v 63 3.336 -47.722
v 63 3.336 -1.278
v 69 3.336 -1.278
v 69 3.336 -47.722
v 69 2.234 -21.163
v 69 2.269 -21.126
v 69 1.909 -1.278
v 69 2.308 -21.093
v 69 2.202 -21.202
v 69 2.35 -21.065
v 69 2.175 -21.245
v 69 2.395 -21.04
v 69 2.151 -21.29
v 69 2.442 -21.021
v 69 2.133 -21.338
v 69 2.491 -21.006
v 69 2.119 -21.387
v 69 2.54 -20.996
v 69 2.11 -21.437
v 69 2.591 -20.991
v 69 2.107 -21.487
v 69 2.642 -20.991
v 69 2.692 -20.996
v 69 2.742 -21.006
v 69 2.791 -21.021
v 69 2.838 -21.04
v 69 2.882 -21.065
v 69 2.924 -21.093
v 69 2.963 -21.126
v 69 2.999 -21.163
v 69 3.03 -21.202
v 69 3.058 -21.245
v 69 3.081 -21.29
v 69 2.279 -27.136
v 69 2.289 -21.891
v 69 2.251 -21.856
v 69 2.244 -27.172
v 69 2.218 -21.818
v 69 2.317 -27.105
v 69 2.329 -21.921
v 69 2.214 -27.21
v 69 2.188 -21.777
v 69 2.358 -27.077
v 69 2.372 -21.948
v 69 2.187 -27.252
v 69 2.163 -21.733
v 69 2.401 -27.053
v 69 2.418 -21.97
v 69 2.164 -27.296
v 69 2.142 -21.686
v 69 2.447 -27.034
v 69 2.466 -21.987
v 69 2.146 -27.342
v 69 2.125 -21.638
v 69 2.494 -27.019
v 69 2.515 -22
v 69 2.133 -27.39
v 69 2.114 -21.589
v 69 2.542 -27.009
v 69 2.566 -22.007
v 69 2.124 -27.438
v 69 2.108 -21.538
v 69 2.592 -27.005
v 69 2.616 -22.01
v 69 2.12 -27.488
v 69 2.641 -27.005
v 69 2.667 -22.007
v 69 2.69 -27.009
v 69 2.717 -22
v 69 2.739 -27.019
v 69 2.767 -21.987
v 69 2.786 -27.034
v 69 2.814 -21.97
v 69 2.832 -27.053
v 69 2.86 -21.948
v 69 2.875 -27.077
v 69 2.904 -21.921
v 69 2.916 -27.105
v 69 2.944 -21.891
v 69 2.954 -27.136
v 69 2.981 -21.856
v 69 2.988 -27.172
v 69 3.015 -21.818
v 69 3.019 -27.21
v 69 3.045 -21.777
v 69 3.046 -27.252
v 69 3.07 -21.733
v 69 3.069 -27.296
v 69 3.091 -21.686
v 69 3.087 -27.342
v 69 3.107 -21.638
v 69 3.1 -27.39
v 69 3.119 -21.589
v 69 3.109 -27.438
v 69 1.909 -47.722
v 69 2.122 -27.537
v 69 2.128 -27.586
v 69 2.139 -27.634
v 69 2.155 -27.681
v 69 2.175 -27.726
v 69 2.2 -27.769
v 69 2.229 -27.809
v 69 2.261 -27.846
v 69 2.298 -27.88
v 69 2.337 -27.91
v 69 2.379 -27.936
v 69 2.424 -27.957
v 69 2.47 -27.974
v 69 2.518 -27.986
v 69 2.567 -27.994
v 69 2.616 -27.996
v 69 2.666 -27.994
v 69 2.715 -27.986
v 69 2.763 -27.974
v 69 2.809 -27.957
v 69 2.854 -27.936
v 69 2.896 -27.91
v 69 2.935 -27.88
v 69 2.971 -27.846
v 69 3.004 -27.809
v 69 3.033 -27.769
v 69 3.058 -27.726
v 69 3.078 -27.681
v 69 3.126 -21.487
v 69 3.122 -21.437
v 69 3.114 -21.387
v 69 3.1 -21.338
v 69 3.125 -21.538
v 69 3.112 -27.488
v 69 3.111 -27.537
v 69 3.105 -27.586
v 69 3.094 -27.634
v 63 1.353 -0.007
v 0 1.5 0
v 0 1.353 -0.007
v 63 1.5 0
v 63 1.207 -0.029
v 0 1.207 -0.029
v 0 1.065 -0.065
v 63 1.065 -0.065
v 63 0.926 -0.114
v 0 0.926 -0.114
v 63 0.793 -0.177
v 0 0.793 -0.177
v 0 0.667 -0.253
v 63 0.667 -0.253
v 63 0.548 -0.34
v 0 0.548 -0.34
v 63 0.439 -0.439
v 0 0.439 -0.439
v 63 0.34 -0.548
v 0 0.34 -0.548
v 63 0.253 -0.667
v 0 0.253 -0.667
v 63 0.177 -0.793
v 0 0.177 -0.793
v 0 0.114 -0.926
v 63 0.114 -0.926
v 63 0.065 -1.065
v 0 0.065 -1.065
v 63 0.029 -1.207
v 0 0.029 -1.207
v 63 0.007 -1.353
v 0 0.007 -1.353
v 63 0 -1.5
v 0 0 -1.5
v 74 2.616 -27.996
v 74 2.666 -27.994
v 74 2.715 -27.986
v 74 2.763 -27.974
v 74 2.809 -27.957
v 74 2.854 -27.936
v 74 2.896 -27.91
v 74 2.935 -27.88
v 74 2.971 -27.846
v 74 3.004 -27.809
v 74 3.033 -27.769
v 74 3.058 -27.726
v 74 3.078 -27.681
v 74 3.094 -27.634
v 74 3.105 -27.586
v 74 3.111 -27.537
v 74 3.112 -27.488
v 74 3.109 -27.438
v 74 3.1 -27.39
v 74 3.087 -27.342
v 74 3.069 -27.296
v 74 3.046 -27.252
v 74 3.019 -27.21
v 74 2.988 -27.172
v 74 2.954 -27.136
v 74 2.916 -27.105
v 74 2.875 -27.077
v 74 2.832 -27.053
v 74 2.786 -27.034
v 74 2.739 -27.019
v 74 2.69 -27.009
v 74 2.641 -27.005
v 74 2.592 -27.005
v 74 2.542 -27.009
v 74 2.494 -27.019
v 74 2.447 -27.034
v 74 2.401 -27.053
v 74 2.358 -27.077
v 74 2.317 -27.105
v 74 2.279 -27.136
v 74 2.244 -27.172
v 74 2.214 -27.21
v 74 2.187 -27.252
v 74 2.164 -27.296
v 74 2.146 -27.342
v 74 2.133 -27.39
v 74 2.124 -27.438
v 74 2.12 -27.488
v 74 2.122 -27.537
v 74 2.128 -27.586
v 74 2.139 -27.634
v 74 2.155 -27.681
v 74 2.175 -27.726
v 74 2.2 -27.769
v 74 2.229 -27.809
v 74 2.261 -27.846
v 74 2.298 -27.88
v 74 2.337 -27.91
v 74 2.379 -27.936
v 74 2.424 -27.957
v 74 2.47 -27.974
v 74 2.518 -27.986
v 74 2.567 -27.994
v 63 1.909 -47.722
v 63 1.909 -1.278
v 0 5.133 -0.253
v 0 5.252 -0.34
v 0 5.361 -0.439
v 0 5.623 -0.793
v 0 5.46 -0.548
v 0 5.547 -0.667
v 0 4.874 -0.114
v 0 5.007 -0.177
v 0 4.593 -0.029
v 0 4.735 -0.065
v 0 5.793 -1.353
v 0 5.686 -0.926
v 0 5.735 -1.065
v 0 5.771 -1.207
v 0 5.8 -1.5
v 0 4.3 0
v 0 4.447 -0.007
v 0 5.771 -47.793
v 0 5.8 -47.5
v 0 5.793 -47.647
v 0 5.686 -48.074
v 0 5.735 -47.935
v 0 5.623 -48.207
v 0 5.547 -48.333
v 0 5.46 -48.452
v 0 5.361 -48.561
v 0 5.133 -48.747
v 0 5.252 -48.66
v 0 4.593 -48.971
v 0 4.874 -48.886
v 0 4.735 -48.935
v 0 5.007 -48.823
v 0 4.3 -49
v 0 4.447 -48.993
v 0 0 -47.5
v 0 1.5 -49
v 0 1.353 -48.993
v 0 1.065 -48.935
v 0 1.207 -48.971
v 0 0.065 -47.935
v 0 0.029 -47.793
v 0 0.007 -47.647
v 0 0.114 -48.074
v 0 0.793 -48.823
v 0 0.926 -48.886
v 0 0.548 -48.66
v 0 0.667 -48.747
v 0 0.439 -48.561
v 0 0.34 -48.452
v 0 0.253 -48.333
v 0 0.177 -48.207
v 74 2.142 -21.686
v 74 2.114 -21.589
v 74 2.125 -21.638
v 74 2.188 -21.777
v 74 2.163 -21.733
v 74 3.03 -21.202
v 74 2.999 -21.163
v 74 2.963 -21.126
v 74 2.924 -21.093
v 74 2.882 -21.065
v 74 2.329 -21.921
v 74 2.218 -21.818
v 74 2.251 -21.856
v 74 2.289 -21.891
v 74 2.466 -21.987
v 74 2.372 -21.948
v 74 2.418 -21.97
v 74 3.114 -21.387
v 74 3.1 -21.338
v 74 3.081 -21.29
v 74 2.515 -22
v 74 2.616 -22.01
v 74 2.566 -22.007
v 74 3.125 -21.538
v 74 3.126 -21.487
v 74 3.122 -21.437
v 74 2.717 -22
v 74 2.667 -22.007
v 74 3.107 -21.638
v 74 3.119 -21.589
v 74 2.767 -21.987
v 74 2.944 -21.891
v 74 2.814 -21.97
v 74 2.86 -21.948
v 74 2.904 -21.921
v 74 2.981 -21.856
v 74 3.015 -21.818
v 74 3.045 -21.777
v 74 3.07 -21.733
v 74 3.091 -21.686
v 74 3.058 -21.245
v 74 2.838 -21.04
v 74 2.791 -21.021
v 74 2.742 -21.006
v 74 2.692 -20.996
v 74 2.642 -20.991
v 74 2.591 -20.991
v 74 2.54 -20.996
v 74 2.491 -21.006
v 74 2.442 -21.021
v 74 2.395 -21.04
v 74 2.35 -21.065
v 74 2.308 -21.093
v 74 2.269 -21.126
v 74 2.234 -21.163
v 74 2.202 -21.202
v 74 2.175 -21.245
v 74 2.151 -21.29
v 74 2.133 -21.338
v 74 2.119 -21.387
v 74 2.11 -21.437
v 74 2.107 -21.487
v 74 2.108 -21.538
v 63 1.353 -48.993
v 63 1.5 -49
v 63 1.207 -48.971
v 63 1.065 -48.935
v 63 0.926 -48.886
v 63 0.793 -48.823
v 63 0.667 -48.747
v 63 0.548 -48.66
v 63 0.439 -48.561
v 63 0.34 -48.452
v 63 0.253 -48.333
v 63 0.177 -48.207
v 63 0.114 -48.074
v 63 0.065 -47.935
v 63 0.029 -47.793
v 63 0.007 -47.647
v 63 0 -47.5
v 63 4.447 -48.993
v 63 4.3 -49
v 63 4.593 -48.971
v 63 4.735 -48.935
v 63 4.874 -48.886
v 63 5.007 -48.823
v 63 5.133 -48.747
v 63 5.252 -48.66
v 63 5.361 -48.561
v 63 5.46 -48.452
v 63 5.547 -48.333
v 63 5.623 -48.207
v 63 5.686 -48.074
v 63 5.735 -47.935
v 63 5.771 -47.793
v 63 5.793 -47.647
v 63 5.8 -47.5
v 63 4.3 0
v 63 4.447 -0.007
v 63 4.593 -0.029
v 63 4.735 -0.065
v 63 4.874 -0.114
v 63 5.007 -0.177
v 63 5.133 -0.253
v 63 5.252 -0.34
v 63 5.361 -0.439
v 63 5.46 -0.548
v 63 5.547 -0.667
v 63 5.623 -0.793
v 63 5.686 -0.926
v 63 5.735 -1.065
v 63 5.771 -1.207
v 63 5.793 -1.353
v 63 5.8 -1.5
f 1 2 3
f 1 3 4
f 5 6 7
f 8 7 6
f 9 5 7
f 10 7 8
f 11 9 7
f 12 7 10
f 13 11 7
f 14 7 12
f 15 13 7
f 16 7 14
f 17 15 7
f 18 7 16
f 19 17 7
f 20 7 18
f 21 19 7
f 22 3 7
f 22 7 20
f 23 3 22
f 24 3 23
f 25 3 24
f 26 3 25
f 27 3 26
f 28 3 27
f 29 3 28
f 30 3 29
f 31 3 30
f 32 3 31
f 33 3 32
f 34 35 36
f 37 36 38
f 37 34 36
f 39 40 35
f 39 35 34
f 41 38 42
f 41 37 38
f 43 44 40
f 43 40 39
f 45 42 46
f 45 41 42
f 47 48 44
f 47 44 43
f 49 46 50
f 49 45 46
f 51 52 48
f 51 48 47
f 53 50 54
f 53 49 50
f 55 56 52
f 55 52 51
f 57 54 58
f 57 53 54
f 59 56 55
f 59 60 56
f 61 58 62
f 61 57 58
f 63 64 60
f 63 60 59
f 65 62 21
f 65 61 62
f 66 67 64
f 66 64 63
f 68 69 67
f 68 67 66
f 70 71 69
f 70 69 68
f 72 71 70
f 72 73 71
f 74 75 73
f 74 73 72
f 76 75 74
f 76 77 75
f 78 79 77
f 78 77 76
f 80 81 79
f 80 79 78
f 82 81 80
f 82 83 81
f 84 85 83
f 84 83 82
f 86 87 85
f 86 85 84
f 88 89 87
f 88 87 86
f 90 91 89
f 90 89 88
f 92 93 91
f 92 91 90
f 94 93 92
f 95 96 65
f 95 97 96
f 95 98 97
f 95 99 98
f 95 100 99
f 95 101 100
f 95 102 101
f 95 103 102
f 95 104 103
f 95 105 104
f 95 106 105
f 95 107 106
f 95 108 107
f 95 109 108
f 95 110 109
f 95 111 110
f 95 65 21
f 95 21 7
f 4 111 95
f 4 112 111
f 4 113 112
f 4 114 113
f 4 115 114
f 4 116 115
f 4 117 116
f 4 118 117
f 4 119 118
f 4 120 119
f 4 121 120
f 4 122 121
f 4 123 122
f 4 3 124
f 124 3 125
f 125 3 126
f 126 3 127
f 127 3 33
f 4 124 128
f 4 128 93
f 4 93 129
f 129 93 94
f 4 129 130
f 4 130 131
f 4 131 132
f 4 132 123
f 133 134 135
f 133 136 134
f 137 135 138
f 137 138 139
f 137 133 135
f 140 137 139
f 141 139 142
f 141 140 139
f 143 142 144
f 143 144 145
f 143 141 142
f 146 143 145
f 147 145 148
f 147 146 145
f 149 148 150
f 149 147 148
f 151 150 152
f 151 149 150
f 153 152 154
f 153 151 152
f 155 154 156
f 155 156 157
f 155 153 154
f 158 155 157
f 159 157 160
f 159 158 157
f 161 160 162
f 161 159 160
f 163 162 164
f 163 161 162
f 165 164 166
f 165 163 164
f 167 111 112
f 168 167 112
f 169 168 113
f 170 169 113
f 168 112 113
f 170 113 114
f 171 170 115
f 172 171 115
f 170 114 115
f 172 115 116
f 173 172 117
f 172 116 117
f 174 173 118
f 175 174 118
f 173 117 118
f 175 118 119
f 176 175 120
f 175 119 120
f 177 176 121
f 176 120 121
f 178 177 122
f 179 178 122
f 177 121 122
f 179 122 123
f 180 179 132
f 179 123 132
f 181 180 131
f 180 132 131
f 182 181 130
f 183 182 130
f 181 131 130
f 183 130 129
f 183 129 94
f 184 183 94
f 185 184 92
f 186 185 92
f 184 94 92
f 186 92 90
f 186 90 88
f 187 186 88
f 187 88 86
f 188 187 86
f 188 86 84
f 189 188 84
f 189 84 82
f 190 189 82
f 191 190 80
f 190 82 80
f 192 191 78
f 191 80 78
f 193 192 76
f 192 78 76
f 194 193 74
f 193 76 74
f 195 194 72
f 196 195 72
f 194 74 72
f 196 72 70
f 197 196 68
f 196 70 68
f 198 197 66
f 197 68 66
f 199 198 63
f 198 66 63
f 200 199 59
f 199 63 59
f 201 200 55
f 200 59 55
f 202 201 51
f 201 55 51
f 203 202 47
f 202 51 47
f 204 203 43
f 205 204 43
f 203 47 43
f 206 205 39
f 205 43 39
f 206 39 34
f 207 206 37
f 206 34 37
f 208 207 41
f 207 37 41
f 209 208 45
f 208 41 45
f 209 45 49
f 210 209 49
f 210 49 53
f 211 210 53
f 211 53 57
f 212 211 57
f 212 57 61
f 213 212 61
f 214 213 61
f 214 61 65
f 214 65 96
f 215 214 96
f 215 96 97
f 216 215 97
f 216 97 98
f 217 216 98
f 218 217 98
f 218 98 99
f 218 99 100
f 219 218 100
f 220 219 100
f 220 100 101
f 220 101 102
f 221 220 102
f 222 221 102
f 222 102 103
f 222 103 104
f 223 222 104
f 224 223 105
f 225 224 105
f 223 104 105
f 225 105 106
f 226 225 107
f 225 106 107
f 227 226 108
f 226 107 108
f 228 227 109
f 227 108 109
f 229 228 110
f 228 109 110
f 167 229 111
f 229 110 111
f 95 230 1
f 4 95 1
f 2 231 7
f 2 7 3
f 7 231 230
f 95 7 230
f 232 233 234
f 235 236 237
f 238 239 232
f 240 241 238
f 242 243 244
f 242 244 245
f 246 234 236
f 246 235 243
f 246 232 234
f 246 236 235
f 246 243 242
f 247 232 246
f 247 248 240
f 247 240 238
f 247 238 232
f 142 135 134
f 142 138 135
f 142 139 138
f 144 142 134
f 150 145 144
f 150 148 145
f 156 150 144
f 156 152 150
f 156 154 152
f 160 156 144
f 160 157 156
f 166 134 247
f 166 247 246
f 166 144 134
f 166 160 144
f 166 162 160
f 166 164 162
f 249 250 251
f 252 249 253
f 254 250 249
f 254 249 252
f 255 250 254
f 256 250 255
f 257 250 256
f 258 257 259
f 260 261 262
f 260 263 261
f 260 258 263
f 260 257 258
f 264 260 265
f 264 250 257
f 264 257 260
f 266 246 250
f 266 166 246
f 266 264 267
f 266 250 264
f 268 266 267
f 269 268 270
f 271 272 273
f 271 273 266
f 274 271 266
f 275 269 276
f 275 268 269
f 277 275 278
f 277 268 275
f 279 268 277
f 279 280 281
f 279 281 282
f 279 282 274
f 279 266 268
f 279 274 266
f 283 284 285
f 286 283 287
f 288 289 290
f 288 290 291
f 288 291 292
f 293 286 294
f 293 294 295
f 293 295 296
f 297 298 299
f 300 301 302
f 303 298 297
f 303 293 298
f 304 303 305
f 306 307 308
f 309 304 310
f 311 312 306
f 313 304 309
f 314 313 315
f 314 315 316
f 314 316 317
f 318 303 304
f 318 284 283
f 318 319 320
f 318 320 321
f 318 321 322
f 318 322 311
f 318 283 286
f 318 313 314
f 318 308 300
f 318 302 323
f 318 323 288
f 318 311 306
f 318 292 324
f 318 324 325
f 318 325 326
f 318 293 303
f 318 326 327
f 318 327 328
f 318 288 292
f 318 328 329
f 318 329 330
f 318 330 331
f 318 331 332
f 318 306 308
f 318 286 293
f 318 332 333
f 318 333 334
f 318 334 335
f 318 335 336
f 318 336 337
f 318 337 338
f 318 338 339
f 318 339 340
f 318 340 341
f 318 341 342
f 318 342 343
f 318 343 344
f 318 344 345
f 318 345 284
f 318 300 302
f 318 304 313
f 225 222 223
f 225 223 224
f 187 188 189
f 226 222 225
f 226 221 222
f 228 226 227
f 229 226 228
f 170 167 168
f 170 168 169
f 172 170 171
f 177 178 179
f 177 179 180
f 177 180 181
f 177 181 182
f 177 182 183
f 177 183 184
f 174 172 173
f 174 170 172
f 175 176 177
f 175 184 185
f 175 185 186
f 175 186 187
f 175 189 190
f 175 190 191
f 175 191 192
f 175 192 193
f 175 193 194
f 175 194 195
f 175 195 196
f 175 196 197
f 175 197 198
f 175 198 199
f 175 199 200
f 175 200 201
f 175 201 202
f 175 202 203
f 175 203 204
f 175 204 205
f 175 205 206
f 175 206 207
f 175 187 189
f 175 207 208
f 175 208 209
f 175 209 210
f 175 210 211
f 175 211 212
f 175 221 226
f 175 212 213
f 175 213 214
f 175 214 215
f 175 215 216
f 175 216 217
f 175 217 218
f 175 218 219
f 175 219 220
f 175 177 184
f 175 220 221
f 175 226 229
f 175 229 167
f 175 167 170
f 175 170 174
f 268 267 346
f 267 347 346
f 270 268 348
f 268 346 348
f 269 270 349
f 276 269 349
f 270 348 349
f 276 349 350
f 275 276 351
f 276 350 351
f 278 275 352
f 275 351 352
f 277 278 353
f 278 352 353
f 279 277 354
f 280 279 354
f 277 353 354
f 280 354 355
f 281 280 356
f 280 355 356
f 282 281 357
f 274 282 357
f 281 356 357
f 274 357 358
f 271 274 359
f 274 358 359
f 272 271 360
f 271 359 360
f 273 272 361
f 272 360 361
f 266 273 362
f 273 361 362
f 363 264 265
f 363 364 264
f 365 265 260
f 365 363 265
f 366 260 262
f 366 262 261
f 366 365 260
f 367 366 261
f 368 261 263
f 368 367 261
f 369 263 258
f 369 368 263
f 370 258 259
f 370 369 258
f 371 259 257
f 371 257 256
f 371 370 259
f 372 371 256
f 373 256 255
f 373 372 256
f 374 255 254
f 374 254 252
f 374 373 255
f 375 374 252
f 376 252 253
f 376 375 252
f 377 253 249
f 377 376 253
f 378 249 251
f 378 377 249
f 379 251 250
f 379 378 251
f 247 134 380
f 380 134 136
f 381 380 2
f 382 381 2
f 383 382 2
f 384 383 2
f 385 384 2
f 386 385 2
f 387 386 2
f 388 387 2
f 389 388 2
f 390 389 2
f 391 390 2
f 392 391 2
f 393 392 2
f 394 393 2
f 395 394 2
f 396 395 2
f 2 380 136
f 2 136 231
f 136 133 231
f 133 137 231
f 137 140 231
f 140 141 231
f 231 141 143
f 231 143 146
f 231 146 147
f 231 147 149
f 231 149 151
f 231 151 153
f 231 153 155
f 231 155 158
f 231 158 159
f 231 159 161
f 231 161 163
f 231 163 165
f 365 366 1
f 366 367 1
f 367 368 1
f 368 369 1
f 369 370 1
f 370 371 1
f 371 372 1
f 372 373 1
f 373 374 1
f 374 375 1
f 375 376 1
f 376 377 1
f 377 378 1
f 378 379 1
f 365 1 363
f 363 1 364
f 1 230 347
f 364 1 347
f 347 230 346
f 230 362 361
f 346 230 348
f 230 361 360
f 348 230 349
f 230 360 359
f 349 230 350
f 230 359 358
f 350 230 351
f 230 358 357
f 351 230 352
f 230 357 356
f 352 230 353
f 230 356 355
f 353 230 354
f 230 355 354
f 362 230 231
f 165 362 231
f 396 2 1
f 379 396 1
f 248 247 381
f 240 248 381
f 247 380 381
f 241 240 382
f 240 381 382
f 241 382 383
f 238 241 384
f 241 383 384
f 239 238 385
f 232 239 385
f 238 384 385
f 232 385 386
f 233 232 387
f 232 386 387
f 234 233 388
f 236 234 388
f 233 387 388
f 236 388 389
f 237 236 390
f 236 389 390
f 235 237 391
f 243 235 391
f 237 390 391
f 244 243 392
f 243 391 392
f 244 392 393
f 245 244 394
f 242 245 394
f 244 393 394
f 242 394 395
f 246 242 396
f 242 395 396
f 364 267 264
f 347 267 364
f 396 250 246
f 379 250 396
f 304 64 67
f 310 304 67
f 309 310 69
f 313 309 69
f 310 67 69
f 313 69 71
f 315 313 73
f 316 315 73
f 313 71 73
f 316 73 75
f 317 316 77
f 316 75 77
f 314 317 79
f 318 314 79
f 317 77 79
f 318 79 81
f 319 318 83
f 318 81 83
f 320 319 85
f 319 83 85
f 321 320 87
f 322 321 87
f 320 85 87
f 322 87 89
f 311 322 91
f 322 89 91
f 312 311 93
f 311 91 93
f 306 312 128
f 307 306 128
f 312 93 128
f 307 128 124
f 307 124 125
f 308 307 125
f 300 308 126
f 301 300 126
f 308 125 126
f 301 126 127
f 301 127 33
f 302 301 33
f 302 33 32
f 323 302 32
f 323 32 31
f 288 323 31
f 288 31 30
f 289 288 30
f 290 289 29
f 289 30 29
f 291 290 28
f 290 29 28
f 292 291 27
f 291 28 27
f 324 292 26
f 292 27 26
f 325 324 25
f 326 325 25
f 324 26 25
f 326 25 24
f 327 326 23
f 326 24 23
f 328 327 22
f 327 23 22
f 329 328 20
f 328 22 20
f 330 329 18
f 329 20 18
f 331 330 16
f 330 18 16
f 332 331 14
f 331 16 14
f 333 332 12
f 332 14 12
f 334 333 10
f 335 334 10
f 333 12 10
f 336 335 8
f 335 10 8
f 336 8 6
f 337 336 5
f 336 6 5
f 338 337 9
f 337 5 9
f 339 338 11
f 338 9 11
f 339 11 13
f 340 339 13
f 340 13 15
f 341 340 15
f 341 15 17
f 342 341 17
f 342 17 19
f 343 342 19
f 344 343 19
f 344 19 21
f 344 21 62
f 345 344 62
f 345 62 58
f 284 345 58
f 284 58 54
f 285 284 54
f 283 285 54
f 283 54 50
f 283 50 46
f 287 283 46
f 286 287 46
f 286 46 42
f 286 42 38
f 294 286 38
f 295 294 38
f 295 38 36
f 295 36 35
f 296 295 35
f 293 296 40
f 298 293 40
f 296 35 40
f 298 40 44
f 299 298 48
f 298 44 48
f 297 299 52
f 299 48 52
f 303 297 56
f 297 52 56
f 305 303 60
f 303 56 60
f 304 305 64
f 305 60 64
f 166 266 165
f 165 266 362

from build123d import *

# Parameters (mm, degrees)
CROQUIS1_W              = 63
CROQUIS1_H              = 49
SALIENTE_EXTRUIR1_DEPTH = 5.8
REDONDEO1_R             = 1.5
CROQUIS2_W              = 46.443628054
CROQUIS2_H              = 1.426596084
SALIENTE_EXTRUIR2_DEPTH = 6
CROQUIS3_R              = 0.510026017
CROQUIS3_R_2            = 0.496056104
SALIENTE_EXTRUIR3_DEPTH = 5


with BuildPart() as part:
    # Croquis1 → Saliente-Extruir1 (new body)
    with BuildSketch(Plane(origin=(0, 0, 0), x_dir=(1, 0, 0), z_dir=(0, 1, 0))):
        with Locations((31.5, 24.5)):
            Rectangle(CROQUIS1_W, CROQUIS1_H)
    extrude(amount=SALIENTE_EXTRUIR1_DEPTH)

    # Redondeo1
    redondeo1_edges = [part.edges().sort_by_distance(p)[0] for p in [
        (31.5, 5.8, -49),
        (31.5, 0, -49),
        (31.5, 0, 0),
        (31.5, 5.8, 0),
    ]]
    fillet(redondeo1_edges, radius=REDONDEO1_R)

    # Croquis2 → Saliente-Extruir2 (add)
    with BuildSketch(Plane(origin=(63, 0, 0), x_dir=(0, 0, -1), z_dir=(1, 0, 0))):
        with Locations((24.5, 2.622606317)):
            Rectangle(CROQUIS2_W, CROQUIS2_H)
    extrude(amount=SALIENTE_EXTRUIR2_DEPTH)

    # Croquis3 → Saliente-Extruir3 (add)
    with BuildSketch(Plane(origin=(69, 0, 0), x_dir=(0, 0, -1), z_dir=(1, 0, 0))):
        with Locations((21.5, 2.616385566)):
            Circle(CROQUIS3_R)
        with Locations((27.5, 2.616385566)):
            Circle(CROQUIS3_R_2)
    extrude(amount=SALIENTE_EXTRUIR3_DEPTH)


solid = part.part
